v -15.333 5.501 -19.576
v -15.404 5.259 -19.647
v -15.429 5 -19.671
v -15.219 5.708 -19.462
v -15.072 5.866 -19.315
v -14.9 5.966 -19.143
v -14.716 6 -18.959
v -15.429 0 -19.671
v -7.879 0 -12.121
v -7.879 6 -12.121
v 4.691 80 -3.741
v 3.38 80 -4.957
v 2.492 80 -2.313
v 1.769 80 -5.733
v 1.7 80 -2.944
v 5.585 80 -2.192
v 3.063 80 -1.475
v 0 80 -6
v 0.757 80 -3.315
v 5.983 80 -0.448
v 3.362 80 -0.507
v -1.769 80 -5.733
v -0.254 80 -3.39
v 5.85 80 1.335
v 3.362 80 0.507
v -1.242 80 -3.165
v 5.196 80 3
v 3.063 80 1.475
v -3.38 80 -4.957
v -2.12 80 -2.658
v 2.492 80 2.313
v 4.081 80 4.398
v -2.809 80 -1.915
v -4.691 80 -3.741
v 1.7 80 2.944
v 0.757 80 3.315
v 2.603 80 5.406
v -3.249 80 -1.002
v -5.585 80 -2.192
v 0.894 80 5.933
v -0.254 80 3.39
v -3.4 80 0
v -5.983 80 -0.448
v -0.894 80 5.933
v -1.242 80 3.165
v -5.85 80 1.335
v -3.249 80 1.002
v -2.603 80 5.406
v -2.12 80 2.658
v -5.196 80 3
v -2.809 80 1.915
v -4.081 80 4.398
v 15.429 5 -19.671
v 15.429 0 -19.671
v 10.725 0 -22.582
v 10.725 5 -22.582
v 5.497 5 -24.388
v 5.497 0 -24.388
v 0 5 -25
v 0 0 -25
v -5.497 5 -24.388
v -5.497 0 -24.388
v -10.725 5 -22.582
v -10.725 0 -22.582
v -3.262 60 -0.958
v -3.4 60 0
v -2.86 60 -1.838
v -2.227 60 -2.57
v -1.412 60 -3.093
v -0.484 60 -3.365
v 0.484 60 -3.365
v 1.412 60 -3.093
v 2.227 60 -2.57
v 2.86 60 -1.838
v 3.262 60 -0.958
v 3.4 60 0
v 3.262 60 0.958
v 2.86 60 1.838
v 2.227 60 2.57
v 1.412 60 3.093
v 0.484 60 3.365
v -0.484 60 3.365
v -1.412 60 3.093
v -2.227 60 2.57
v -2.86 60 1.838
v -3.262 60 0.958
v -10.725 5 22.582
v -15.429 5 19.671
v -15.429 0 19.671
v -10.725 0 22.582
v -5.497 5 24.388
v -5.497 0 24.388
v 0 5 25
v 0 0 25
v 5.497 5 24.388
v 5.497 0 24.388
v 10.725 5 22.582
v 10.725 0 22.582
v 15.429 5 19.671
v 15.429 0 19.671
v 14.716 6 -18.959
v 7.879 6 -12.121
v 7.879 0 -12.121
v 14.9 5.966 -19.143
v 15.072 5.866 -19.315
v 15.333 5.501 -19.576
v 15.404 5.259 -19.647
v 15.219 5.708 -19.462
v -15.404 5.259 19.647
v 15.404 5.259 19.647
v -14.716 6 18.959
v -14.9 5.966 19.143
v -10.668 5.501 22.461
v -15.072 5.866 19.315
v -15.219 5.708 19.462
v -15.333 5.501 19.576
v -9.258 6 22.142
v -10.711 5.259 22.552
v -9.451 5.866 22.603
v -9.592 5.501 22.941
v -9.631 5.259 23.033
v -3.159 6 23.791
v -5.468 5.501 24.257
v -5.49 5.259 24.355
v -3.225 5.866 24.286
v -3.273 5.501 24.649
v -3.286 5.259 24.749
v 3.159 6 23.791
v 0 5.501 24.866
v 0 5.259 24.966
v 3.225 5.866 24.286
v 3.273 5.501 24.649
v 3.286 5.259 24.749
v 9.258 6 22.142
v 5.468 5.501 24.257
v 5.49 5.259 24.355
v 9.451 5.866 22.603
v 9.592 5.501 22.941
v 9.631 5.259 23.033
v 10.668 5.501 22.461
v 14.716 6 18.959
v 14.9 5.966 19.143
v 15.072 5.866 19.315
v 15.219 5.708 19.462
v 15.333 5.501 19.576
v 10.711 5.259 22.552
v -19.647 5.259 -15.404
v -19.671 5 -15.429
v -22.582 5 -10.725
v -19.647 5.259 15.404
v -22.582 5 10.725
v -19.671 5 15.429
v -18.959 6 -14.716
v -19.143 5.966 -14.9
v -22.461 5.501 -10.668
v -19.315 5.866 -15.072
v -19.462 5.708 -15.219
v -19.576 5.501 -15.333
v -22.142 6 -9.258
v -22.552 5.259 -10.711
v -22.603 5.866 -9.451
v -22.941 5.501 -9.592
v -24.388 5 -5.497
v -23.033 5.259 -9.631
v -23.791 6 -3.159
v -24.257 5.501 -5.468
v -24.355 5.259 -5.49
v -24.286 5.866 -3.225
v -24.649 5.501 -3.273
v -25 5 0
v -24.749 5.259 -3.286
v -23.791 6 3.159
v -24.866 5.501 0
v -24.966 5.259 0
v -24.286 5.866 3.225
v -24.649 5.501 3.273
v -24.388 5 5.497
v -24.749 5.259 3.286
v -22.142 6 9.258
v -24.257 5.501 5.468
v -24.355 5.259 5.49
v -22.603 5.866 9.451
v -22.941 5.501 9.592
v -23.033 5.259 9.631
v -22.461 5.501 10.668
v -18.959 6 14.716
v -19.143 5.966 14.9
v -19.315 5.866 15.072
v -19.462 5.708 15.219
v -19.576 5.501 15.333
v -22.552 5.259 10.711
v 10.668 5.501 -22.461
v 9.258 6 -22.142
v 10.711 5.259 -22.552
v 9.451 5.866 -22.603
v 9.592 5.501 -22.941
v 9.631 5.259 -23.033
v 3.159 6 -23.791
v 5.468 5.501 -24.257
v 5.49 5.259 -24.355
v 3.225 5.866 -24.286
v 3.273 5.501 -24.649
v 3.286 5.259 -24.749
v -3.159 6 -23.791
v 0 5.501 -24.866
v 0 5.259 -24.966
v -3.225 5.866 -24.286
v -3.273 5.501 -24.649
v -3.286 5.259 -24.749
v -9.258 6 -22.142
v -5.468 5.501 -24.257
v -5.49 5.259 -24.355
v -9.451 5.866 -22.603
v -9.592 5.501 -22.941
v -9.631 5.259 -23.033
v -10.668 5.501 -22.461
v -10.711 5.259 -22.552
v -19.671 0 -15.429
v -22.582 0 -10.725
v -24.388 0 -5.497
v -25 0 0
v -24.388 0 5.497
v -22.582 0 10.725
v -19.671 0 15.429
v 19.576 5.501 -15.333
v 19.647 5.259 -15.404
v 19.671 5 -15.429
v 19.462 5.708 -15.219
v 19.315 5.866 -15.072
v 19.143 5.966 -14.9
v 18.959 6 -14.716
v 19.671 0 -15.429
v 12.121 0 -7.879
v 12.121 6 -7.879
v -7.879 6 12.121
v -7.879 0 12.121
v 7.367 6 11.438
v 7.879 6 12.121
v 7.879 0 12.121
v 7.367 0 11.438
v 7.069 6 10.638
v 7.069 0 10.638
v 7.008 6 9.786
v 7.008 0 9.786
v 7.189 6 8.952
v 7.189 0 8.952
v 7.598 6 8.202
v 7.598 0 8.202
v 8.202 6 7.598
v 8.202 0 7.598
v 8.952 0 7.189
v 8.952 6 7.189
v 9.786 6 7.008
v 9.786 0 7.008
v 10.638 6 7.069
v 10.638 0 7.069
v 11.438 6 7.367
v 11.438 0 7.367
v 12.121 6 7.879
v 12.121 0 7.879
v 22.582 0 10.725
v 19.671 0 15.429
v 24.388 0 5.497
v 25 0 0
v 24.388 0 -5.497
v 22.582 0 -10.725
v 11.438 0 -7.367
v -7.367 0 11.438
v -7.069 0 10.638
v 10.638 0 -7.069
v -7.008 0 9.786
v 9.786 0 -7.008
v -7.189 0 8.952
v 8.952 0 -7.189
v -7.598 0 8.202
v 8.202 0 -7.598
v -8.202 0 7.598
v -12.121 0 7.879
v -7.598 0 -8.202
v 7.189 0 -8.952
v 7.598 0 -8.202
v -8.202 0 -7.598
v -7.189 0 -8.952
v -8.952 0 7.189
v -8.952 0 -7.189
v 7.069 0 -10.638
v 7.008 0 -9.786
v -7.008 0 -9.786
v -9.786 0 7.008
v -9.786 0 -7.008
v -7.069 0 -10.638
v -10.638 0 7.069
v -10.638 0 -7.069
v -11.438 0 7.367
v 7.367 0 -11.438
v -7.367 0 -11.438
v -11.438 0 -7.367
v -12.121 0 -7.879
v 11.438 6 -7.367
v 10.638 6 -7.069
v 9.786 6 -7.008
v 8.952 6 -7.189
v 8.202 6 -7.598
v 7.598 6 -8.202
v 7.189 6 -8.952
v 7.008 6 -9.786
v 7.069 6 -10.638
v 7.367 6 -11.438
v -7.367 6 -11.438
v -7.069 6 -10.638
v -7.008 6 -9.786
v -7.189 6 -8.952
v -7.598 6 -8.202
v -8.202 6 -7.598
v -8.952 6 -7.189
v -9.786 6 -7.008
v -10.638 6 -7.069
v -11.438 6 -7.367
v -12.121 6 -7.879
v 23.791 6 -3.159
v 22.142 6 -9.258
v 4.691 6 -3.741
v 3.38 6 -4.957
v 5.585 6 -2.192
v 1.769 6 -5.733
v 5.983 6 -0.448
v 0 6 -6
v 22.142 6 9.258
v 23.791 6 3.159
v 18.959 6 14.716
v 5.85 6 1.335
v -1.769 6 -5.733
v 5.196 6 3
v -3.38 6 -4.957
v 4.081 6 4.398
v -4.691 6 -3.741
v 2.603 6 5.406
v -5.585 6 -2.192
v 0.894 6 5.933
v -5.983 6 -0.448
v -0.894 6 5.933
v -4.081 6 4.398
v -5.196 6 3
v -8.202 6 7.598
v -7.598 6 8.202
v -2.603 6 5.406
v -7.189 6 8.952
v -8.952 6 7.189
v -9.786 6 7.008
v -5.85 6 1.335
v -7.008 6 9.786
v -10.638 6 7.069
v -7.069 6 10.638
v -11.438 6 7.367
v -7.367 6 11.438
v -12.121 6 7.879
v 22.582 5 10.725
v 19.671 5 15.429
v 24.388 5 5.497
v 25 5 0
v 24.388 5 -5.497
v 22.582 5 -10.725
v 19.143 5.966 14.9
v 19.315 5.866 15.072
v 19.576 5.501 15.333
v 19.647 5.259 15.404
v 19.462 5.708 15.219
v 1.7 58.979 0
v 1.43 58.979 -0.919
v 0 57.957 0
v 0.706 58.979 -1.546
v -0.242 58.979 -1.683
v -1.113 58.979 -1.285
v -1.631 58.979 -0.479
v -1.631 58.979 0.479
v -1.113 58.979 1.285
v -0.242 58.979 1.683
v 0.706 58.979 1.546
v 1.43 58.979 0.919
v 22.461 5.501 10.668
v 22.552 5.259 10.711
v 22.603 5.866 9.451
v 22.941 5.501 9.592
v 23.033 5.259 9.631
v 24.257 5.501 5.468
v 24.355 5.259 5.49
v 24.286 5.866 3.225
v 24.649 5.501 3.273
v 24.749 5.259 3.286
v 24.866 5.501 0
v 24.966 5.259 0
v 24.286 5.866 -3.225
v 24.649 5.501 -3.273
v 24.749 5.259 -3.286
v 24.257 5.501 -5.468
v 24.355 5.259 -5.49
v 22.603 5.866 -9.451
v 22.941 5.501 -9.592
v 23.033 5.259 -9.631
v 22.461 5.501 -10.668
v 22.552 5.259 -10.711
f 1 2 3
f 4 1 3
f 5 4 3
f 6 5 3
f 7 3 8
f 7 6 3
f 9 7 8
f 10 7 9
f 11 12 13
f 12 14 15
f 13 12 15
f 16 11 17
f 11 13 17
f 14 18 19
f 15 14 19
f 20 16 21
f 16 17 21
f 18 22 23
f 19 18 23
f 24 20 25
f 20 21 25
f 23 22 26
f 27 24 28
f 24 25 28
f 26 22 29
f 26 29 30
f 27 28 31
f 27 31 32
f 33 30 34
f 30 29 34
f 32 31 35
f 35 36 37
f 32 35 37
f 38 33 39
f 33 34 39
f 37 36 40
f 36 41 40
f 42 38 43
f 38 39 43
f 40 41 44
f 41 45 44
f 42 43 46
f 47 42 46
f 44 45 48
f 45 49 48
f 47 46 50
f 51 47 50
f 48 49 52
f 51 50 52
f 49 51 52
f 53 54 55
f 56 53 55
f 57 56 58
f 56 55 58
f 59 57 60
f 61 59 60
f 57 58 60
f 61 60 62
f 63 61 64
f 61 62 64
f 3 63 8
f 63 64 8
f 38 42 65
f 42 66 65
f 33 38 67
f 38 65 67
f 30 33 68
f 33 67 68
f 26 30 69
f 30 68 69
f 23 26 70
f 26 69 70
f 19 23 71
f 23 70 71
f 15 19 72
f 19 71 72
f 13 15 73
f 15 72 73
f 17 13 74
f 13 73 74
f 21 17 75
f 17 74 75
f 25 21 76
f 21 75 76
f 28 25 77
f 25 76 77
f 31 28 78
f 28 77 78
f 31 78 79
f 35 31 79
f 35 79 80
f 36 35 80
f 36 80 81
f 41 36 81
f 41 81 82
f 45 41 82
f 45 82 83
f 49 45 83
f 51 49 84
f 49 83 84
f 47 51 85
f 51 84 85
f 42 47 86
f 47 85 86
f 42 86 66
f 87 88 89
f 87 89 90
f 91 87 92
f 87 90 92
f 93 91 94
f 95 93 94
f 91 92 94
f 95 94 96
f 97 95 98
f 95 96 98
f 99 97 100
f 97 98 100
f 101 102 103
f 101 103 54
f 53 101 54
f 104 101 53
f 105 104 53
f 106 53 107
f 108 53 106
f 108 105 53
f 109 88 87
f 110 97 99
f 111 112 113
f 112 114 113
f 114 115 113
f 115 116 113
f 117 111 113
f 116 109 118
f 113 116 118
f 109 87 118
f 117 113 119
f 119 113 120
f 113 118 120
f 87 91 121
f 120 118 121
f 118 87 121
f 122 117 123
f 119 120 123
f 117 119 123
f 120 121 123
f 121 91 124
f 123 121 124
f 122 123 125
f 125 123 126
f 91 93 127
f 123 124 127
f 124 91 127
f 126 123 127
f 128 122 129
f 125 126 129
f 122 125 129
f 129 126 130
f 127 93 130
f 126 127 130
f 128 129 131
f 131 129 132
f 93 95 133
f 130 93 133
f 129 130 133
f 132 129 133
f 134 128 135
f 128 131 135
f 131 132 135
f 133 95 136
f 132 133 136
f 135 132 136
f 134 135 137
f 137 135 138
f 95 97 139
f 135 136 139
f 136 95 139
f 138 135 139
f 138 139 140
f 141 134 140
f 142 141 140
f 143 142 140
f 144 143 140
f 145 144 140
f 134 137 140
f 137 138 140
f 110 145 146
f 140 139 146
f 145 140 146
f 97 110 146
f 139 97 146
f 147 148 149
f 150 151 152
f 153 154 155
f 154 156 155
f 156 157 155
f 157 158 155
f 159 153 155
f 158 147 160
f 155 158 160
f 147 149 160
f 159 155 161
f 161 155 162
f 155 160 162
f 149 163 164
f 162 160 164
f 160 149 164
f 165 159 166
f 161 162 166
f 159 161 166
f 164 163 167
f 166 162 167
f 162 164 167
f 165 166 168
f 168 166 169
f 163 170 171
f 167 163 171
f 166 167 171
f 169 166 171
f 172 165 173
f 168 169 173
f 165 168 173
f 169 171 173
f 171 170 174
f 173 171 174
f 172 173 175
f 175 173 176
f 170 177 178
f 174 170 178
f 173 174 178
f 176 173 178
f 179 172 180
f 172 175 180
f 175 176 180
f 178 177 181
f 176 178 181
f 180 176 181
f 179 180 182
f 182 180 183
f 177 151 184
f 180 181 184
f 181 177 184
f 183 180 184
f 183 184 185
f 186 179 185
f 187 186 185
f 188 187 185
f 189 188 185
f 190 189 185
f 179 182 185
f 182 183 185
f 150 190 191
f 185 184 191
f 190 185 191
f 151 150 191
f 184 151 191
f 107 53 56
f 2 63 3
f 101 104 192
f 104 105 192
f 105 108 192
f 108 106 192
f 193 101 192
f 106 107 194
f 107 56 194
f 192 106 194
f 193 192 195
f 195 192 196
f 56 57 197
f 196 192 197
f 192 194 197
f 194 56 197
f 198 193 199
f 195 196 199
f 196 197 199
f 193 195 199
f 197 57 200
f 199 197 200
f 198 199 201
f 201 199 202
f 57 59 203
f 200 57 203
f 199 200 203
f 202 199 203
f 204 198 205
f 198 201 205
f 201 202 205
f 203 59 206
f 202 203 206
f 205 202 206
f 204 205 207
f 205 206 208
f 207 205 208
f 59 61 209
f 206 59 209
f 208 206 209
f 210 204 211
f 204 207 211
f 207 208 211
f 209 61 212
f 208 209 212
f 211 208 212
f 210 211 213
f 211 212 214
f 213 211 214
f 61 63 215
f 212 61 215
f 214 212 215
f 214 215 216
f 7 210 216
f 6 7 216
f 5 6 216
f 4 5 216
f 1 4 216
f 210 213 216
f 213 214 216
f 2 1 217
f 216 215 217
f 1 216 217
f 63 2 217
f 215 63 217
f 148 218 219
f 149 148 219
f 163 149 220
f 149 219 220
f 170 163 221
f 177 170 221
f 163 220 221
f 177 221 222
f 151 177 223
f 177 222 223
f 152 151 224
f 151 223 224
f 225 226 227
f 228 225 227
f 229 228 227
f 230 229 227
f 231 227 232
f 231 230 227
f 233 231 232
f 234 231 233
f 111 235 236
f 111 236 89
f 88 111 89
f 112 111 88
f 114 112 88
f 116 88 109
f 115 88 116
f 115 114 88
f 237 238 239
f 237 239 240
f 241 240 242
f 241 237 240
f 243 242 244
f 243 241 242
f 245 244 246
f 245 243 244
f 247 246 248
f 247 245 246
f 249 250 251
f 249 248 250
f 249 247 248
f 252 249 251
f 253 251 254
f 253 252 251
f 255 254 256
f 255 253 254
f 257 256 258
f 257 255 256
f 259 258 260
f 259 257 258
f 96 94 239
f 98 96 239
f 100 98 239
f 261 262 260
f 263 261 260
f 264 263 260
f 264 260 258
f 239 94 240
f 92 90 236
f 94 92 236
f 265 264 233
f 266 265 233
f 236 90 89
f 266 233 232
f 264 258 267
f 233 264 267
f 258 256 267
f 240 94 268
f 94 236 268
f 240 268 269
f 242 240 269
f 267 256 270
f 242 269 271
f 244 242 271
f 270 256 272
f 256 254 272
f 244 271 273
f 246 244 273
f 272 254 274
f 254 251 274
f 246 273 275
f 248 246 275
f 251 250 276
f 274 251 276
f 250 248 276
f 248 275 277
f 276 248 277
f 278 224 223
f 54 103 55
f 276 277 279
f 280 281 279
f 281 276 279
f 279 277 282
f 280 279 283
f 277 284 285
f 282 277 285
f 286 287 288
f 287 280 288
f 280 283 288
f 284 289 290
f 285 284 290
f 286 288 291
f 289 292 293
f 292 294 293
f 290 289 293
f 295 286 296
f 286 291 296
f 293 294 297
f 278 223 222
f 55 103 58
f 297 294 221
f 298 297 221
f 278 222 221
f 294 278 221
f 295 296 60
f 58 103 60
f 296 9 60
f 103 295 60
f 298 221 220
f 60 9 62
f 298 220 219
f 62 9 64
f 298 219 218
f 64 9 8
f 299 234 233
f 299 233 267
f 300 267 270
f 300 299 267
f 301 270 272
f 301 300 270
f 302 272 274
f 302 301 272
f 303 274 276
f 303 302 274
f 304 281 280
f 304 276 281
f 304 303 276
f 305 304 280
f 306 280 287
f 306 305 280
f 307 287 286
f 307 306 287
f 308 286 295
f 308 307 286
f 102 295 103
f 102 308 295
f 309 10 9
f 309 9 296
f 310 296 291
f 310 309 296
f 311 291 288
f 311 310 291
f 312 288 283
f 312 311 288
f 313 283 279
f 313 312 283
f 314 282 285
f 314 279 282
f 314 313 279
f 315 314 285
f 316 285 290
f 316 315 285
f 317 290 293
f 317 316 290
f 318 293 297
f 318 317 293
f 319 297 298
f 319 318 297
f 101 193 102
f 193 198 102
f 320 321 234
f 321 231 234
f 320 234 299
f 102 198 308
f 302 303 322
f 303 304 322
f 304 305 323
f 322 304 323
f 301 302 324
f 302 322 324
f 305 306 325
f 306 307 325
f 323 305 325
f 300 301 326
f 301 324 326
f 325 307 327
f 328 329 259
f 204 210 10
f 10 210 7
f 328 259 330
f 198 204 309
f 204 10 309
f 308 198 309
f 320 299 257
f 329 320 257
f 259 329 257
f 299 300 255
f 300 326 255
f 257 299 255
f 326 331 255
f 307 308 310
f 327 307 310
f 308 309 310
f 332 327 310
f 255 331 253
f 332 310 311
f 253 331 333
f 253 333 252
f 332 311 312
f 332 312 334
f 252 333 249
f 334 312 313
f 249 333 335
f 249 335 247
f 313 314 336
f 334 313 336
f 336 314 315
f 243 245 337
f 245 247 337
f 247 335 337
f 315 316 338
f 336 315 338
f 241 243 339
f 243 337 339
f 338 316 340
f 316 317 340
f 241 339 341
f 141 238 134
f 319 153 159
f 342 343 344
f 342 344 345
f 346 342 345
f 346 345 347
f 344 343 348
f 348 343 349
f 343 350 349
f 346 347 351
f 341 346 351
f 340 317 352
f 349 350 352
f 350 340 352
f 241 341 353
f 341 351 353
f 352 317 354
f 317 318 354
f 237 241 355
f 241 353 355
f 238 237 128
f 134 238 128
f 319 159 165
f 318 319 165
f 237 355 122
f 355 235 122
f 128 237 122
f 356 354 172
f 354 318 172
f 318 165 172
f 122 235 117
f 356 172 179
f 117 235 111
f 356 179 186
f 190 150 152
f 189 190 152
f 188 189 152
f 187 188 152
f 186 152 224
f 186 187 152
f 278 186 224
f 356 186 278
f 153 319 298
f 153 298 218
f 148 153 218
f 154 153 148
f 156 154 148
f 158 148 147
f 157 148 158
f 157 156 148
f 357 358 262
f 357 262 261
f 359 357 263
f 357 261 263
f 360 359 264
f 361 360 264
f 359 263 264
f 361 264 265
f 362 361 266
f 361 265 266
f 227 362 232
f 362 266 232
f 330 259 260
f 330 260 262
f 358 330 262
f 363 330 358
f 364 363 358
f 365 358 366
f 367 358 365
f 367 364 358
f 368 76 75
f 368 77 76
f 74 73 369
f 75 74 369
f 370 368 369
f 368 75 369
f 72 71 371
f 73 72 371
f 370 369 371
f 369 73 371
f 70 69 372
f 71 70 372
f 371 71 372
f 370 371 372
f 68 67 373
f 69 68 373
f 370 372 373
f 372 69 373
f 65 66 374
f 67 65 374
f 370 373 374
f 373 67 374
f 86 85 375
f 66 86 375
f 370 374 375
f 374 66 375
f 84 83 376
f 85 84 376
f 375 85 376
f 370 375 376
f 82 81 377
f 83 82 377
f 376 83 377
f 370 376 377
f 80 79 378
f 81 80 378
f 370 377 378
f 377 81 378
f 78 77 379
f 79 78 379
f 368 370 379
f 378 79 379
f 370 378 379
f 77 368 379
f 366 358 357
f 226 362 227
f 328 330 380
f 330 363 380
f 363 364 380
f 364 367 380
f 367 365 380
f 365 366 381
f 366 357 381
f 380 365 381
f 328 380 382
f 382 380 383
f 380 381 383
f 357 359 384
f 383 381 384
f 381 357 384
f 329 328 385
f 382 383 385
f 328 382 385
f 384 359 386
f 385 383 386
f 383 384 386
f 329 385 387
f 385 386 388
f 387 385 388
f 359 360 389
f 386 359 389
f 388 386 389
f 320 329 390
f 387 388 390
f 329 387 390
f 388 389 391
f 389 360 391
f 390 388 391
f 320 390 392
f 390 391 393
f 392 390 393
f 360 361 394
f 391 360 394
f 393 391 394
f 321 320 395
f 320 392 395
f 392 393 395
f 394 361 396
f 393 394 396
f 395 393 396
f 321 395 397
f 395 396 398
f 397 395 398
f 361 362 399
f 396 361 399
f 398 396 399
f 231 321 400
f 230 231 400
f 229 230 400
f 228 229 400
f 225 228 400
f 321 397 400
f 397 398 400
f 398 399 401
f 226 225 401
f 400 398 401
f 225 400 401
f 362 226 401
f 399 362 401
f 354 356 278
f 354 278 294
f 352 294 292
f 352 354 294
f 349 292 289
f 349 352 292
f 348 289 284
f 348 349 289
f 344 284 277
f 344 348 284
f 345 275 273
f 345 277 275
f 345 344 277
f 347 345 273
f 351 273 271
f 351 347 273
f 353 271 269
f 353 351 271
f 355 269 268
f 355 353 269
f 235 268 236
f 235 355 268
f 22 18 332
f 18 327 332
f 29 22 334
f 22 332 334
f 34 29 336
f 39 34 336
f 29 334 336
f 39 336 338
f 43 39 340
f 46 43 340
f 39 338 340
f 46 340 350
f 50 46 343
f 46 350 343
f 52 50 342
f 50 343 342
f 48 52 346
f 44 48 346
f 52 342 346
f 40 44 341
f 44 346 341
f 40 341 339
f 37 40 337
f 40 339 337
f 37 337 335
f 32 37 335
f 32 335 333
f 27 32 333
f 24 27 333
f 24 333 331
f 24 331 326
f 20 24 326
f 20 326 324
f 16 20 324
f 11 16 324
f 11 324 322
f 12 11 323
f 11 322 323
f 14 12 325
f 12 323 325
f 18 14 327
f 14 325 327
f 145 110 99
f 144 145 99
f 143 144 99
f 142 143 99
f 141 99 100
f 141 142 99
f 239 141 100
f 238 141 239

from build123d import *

# Parameters (mm, degrees)
FILLET_1_R             = 1
HOLE_WIZARD_M8_1_D     = 6.8
HOLE_WIZARD_M8_1_DEPTH = 20
HOLE_WIZARD_M8_1_TIP   = 2.042926105
CUT_EXTRUDE_1_DEPTH    = 83.012194246


with BuildPart() as part:
    # 草图1 → 旋转1 (revolve)
    with BuildSketch(Plane.XY, mode=Mode.PRIVATE) as revolve_1_sk:
        Polygon((0, 0), (0, 80), (-6, 80), (-6, 6), (-25, 6), (-25, 0), align=None)
    revolve(revolve_1_sk.sketch.rotate(Axis((0, 0, 0), (0, 1, 0)), 270), axis=Axis((0, 0, 0), (0, 1, 0)))

    # 圆角1
    fillet_1_edges = [part.edges().sort_by_distance(p)[0] for p in [
        (0, 6, 25),
    ]]
    fillet(fillet_1_edges, radius=FILLET_1_R)

    # M8 螺纹槽口的螺纹槽口钻头1
    with Locations(Plane(origin=(0, 80, 0), x_dir=(1, 0, 0), z_dir=(0, 1, 0))):
        with Locations((0, 0)):
            Hole(HOLE_WIZARD_M8_1_D / 2, depth=HOLE_WIZARD_M8_1_DEPTH)
            with Locations((0, 0, -(HOLE_WIZARD_M8_1_DEPTH + HOLE_WIZARD_M8_1_TIP / 2))):  # 118° drill point
                Cone(0, HOLE_WIZARD_M8_1_D / 2, HOLE_WIZARD_M8_1_TIP, mode=Mode.SUBTRACT)

    # 草图5 → 切除-拉伸1 (cut, through all)
    with BuildSketch(Plane(origin=(0, 6, 0), x_dir=(1, 0, 0), z_dir=(0, 1, 0))):
        with BuildLine():
            Line((12.121320344, -7.878679656), (22.727922061, -18.485281374))
            ThreePointArc((22.727922061, -18.485281374), (22.727922061, -22.727922061), (18.485281374, -22.727922061))
            Line((18.485281374, -22.727922061), (7.878679656, -12.121320344))
            ThreePointArc((7.878679656, -12.121320344), (7.878679656, -7.878679656), (12.121320344, -7.878679656))
        make_face()
        with BuildLine():
            Line((-7.878679656, -12.121320344), (-18.485281374, -22.727922061))
            ThreePointArc((-18.485281374, -22.727922061), (-22.727922061, -22.727922061), (-22.727922061, -18.485281374))
            Line((-22.727922061, -18.485281374), (-12.121320344, -7.878679656))
            ThreePointArc((-12.121320344, -7.878679656), (-7.878679656, -7.878679656), (-7.878679656, -12.121320344))
        make_face()
        with BuildLine():
            Line((-12.121320344, 7.878679656), (-22.727922061, 18.485281374))
            ThreePointArc((-22.727922061, 18.485281374), (-22.727922061, 22.727922061), (-18.485281374, 22.727922061))
            Line((-18.485281374, 22.727922061), (-7.878679656, 12.121320344))
            ThreePointArc((-7.878679656, 12.121320344), (-7.878679656, 7.878679656), (-12.121320344, 7.878679656))
        make_face()
        with BuildLine():
            Line((7.878679656, 12.121320344), (18.485281374, 22.727922061))
            ThreePointArc((18.485281374, 22.727922061), (22.727922061, 22.727922061), (22.727922061, 18.485281374))
            Line((22.727922061, 18.485281374), (12.121320344, 7.878679656))
            ThreePointArc((12.121320344, 7.878679656), (7.878679656, 7.878679656), (7.878679656, 12.121320344))
        make_face()
    extrude(amount=-CUT_EXTRUDE_1_DEPTH, mode=Mode.SUBTRACT)


solid = part.part
